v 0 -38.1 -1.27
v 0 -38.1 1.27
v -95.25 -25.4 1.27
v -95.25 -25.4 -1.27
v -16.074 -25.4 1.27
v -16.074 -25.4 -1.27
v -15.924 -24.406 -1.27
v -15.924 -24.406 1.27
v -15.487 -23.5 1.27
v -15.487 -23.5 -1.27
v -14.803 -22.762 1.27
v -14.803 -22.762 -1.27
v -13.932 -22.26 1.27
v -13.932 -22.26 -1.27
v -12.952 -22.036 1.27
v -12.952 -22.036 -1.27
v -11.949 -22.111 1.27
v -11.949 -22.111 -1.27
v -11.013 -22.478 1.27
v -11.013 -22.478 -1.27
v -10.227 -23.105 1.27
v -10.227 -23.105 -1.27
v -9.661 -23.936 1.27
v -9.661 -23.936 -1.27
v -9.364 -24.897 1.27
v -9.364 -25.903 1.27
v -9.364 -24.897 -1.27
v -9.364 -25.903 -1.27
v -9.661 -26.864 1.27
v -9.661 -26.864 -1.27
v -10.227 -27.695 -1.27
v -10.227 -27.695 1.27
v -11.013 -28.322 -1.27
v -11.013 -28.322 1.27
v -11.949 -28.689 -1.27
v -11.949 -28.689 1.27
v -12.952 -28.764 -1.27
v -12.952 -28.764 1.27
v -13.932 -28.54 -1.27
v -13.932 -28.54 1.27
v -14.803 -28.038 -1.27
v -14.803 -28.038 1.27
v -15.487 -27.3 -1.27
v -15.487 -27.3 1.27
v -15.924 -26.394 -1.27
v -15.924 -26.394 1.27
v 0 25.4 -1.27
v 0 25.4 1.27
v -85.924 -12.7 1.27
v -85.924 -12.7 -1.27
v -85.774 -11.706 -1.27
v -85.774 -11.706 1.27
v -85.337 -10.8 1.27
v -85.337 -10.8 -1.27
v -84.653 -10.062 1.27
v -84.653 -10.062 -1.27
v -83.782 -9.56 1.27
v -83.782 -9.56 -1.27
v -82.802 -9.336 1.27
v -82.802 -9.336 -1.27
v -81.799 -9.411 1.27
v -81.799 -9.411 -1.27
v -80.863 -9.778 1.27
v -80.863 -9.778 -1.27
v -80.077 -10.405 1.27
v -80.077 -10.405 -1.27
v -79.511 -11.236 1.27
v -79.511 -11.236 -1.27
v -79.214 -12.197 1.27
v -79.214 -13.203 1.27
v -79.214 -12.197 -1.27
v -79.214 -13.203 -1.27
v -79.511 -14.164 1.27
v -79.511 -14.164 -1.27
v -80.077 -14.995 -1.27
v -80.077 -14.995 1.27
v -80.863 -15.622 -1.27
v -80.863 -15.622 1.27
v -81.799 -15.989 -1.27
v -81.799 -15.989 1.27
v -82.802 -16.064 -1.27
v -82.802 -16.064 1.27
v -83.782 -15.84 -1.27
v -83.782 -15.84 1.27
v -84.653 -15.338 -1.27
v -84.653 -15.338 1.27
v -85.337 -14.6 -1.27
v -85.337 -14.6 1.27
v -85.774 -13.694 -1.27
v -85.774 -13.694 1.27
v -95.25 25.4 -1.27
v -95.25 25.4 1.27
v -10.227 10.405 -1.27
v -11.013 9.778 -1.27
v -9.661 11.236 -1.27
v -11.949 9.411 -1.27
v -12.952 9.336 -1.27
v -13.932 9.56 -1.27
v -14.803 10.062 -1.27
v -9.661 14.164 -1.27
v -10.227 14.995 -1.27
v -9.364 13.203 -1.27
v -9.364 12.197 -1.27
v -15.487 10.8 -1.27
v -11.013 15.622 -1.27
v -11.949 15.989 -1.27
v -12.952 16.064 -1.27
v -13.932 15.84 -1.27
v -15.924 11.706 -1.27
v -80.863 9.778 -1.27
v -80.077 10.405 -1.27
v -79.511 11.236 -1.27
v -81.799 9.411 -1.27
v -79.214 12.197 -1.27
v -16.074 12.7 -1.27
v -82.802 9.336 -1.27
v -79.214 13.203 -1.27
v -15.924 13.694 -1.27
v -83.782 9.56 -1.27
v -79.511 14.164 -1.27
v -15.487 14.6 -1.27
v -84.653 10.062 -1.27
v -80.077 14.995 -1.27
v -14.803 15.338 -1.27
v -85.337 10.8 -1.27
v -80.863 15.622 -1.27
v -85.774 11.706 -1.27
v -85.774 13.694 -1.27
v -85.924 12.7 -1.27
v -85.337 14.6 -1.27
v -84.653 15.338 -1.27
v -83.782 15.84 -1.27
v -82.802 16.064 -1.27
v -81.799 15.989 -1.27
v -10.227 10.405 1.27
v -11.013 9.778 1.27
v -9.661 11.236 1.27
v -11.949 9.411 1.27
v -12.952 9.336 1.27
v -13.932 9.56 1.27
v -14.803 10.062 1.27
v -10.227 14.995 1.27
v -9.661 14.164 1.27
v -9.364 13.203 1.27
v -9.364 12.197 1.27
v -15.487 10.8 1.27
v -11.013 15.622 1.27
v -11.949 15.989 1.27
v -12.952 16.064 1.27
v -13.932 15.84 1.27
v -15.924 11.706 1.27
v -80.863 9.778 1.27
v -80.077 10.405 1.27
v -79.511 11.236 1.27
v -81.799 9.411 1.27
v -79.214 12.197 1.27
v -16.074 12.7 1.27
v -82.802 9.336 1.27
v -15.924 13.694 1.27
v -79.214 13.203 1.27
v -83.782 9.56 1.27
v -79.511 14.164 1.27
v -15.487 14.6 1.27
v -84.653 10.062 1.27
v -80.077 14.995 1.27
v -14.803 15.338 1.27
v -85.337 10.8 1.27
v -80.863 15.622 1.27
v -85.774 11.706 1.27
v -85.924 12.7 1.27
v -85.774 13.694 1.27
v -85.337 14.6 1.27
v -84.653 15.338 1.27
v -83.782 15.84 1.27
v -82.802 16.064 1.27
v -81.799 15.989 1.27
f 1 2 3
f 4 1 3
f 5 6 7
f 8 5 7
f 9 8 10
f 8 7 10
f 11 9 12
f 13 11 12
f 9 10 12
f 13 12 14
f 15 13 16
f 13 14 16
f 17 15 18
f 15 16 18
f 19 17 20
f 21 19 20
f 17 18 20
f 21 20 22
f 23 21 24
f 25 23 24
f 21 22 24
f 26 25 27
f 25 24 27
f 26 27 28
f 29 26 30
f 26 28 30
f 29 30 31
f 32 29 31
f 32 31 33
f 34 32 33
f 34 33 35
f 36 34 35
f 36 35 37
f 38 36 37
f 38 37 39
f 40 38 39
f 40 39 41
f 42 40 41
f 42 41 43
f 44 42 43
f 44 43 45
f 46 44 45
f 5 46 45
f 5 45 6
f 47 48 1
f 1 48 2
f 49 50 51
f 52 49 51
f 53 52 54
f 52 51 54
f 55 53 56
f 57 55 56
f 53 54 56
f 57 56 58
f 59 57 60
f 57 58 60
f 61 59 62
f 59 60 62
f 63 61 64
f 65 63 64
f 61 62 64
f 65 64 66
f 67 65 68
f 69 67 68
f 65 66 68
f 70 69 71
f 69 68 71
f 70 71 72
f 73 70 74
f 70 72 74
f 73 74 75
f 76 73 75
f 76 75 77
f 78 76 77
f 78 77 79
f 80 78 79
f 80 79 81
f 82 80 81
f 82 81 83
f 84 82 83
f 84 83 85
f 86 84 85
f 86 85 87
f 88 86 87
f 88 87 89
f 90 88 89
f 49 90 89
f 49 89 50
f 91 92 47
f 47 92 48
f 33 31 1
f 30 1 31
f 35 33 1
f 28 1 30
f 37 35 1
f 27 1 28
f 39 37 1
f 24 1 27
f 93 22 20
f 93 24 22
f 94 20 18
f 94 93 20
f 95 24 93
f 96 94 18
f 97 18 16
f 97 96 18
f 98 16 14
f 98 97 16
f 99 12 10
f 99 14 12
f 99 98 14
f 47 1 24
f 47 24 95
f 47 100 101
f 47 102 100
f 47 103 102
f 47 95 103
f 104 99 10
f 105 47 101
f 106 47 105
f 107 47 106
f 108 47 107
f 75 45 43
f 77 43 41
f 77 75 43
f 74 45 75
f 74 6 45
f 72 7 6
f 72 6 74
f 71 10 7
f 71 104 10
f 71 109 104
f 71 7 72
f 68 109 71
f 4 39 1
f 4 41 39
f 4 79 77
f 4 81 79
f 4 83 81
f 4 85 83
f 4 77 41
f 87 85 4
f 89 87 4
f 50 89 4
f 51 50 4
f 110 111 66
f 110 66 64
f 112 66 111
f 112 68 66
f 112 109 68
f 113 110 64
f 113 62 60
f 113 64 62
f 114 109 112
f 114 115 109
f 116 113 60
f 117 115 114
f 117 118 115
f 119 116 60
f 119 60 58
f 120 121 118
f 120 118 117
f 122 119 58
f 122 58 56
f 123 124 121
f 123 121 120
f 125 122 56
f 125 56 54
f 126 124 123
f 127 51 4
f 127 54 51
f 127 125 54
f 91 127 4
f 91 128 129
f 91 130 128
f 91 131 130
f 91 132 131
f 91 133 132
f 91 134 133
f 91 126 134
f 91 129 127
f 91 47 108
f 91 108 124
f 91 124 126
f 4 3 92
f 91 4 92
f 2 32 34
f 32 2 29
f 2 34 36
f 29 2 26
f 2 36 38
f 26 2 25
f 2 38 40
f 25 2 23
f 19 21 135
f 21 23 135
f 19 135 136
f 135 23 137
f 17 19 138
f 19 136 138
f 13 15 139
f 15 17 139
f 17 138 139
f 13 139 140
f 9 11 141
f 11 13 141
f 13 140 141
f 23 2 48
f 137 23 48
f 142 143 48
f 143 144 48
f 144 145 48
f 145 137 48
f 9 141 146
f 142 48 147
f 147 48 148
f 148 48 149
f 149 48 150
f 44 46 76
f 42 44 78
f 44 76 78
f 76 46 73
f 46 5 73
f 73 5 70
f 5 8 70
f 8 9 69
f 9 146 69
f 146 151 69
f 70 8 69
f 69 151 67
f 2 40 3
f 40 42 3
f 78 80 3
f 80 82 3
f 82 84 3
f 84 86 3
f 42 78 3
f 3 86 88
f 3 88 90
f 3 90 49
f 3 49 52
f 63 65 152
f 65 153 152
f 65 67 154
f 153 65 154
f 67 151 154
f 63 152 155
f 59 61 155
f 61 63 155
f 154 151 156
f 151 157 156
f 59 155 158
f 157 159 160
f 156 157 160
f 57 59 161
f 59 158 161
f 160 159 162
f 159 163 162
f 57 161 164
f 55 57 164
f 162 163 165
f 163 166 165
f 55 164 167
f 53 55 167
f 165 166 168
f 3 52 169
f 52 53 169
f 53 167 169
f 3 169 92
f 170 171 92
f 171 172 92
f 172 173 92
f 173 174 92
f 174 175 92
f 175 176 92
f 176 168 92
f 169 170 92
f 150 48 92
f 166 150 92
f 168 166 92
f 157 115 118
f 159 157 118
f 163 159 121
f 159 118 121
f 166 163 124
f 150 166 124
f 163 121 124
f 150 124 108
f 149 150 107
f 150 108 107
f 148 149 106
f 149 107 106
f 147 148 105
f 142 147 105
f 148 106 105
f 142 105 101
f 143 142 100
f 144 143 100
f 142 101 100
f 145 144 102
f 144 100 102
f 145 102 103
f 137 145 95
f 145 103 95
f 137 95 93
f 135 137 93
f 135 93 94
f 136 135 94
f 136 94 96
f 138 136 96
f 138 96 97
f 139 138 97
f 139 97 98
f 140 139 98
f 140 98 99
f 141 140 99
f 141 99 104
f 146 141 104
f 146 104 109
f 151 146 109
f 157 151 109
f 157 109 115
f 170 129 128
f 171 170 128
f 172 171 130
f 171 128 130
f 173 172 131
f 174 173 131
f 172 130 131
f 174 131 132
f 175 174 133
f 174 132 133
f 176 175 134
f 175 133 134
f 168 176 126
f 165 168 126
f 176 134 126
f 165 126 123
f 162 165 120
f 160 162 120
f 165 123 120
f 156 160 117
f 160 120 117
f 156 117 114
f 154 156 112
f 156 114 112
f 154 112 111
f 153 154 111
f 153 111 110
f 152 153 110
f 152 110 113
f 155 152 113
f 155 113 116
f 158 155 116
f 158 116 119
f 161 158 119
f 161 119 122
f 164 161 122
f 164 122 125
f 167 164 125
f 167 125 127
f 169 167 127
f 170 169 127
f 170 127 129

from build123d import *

# Parameters (mm, degrees)
BOSS_EXTRUDE3_DEPTH              = 1.27
SKETCH4_W                        = 107.901987654
SKETCH4_H                        = 12.7
CUT_EXTRUDE1_DEPTH               = 1
CUT_EXTRUDE1_DEPTH_BACK          = 3.54
F_17_64_0_26563_DIAMETER_HOLE1_D = 6.747002


with BuildPart() as part:
    # Sketch2 → Boss-Extrude3 (new body, symmetric)
    with BuildSketch(Plane.XY):
        Polygon((-95.25, -25.4), (-95.25, 25.4), (0, 38.1), (0, -38.1), align=None)
    extrude(amount=BOSS_EXTRUDE3_DEPTH, both=True)

    # Sketch4 → Cut-Extrude1 (cut, two sides)
    with BuildSketch(Plane.XY.offset(1.27)) as cut_extrude1_sk:
        with Locations((-53.950993827, 31.75)):
            Rectangle(SKETCH4_W, SKETCH4_H)
    extrude(amount=CUT_EXTRUDE1_DEPTH, mode=Mode.SUBTRACT)
    extrude(cut_extrude1_sk.sketch, amount=-CUT_EXTRUDE1_DEPTH_BACK, mode=Mode.SUBTRACT)

    # 17/64 (0.26563) Diameter Hole1 (through all)
    with Locations(Plane.XY.offset(1.27)):
        with Locations((-82.55, 12.7), (-82.55, -12.7), (-12.7, -25.4), (-12.7, 12.7)):
            Hole(F_17_64_0_26563_DIAMETER_HOLE1_D / 2)


solid = part.part
